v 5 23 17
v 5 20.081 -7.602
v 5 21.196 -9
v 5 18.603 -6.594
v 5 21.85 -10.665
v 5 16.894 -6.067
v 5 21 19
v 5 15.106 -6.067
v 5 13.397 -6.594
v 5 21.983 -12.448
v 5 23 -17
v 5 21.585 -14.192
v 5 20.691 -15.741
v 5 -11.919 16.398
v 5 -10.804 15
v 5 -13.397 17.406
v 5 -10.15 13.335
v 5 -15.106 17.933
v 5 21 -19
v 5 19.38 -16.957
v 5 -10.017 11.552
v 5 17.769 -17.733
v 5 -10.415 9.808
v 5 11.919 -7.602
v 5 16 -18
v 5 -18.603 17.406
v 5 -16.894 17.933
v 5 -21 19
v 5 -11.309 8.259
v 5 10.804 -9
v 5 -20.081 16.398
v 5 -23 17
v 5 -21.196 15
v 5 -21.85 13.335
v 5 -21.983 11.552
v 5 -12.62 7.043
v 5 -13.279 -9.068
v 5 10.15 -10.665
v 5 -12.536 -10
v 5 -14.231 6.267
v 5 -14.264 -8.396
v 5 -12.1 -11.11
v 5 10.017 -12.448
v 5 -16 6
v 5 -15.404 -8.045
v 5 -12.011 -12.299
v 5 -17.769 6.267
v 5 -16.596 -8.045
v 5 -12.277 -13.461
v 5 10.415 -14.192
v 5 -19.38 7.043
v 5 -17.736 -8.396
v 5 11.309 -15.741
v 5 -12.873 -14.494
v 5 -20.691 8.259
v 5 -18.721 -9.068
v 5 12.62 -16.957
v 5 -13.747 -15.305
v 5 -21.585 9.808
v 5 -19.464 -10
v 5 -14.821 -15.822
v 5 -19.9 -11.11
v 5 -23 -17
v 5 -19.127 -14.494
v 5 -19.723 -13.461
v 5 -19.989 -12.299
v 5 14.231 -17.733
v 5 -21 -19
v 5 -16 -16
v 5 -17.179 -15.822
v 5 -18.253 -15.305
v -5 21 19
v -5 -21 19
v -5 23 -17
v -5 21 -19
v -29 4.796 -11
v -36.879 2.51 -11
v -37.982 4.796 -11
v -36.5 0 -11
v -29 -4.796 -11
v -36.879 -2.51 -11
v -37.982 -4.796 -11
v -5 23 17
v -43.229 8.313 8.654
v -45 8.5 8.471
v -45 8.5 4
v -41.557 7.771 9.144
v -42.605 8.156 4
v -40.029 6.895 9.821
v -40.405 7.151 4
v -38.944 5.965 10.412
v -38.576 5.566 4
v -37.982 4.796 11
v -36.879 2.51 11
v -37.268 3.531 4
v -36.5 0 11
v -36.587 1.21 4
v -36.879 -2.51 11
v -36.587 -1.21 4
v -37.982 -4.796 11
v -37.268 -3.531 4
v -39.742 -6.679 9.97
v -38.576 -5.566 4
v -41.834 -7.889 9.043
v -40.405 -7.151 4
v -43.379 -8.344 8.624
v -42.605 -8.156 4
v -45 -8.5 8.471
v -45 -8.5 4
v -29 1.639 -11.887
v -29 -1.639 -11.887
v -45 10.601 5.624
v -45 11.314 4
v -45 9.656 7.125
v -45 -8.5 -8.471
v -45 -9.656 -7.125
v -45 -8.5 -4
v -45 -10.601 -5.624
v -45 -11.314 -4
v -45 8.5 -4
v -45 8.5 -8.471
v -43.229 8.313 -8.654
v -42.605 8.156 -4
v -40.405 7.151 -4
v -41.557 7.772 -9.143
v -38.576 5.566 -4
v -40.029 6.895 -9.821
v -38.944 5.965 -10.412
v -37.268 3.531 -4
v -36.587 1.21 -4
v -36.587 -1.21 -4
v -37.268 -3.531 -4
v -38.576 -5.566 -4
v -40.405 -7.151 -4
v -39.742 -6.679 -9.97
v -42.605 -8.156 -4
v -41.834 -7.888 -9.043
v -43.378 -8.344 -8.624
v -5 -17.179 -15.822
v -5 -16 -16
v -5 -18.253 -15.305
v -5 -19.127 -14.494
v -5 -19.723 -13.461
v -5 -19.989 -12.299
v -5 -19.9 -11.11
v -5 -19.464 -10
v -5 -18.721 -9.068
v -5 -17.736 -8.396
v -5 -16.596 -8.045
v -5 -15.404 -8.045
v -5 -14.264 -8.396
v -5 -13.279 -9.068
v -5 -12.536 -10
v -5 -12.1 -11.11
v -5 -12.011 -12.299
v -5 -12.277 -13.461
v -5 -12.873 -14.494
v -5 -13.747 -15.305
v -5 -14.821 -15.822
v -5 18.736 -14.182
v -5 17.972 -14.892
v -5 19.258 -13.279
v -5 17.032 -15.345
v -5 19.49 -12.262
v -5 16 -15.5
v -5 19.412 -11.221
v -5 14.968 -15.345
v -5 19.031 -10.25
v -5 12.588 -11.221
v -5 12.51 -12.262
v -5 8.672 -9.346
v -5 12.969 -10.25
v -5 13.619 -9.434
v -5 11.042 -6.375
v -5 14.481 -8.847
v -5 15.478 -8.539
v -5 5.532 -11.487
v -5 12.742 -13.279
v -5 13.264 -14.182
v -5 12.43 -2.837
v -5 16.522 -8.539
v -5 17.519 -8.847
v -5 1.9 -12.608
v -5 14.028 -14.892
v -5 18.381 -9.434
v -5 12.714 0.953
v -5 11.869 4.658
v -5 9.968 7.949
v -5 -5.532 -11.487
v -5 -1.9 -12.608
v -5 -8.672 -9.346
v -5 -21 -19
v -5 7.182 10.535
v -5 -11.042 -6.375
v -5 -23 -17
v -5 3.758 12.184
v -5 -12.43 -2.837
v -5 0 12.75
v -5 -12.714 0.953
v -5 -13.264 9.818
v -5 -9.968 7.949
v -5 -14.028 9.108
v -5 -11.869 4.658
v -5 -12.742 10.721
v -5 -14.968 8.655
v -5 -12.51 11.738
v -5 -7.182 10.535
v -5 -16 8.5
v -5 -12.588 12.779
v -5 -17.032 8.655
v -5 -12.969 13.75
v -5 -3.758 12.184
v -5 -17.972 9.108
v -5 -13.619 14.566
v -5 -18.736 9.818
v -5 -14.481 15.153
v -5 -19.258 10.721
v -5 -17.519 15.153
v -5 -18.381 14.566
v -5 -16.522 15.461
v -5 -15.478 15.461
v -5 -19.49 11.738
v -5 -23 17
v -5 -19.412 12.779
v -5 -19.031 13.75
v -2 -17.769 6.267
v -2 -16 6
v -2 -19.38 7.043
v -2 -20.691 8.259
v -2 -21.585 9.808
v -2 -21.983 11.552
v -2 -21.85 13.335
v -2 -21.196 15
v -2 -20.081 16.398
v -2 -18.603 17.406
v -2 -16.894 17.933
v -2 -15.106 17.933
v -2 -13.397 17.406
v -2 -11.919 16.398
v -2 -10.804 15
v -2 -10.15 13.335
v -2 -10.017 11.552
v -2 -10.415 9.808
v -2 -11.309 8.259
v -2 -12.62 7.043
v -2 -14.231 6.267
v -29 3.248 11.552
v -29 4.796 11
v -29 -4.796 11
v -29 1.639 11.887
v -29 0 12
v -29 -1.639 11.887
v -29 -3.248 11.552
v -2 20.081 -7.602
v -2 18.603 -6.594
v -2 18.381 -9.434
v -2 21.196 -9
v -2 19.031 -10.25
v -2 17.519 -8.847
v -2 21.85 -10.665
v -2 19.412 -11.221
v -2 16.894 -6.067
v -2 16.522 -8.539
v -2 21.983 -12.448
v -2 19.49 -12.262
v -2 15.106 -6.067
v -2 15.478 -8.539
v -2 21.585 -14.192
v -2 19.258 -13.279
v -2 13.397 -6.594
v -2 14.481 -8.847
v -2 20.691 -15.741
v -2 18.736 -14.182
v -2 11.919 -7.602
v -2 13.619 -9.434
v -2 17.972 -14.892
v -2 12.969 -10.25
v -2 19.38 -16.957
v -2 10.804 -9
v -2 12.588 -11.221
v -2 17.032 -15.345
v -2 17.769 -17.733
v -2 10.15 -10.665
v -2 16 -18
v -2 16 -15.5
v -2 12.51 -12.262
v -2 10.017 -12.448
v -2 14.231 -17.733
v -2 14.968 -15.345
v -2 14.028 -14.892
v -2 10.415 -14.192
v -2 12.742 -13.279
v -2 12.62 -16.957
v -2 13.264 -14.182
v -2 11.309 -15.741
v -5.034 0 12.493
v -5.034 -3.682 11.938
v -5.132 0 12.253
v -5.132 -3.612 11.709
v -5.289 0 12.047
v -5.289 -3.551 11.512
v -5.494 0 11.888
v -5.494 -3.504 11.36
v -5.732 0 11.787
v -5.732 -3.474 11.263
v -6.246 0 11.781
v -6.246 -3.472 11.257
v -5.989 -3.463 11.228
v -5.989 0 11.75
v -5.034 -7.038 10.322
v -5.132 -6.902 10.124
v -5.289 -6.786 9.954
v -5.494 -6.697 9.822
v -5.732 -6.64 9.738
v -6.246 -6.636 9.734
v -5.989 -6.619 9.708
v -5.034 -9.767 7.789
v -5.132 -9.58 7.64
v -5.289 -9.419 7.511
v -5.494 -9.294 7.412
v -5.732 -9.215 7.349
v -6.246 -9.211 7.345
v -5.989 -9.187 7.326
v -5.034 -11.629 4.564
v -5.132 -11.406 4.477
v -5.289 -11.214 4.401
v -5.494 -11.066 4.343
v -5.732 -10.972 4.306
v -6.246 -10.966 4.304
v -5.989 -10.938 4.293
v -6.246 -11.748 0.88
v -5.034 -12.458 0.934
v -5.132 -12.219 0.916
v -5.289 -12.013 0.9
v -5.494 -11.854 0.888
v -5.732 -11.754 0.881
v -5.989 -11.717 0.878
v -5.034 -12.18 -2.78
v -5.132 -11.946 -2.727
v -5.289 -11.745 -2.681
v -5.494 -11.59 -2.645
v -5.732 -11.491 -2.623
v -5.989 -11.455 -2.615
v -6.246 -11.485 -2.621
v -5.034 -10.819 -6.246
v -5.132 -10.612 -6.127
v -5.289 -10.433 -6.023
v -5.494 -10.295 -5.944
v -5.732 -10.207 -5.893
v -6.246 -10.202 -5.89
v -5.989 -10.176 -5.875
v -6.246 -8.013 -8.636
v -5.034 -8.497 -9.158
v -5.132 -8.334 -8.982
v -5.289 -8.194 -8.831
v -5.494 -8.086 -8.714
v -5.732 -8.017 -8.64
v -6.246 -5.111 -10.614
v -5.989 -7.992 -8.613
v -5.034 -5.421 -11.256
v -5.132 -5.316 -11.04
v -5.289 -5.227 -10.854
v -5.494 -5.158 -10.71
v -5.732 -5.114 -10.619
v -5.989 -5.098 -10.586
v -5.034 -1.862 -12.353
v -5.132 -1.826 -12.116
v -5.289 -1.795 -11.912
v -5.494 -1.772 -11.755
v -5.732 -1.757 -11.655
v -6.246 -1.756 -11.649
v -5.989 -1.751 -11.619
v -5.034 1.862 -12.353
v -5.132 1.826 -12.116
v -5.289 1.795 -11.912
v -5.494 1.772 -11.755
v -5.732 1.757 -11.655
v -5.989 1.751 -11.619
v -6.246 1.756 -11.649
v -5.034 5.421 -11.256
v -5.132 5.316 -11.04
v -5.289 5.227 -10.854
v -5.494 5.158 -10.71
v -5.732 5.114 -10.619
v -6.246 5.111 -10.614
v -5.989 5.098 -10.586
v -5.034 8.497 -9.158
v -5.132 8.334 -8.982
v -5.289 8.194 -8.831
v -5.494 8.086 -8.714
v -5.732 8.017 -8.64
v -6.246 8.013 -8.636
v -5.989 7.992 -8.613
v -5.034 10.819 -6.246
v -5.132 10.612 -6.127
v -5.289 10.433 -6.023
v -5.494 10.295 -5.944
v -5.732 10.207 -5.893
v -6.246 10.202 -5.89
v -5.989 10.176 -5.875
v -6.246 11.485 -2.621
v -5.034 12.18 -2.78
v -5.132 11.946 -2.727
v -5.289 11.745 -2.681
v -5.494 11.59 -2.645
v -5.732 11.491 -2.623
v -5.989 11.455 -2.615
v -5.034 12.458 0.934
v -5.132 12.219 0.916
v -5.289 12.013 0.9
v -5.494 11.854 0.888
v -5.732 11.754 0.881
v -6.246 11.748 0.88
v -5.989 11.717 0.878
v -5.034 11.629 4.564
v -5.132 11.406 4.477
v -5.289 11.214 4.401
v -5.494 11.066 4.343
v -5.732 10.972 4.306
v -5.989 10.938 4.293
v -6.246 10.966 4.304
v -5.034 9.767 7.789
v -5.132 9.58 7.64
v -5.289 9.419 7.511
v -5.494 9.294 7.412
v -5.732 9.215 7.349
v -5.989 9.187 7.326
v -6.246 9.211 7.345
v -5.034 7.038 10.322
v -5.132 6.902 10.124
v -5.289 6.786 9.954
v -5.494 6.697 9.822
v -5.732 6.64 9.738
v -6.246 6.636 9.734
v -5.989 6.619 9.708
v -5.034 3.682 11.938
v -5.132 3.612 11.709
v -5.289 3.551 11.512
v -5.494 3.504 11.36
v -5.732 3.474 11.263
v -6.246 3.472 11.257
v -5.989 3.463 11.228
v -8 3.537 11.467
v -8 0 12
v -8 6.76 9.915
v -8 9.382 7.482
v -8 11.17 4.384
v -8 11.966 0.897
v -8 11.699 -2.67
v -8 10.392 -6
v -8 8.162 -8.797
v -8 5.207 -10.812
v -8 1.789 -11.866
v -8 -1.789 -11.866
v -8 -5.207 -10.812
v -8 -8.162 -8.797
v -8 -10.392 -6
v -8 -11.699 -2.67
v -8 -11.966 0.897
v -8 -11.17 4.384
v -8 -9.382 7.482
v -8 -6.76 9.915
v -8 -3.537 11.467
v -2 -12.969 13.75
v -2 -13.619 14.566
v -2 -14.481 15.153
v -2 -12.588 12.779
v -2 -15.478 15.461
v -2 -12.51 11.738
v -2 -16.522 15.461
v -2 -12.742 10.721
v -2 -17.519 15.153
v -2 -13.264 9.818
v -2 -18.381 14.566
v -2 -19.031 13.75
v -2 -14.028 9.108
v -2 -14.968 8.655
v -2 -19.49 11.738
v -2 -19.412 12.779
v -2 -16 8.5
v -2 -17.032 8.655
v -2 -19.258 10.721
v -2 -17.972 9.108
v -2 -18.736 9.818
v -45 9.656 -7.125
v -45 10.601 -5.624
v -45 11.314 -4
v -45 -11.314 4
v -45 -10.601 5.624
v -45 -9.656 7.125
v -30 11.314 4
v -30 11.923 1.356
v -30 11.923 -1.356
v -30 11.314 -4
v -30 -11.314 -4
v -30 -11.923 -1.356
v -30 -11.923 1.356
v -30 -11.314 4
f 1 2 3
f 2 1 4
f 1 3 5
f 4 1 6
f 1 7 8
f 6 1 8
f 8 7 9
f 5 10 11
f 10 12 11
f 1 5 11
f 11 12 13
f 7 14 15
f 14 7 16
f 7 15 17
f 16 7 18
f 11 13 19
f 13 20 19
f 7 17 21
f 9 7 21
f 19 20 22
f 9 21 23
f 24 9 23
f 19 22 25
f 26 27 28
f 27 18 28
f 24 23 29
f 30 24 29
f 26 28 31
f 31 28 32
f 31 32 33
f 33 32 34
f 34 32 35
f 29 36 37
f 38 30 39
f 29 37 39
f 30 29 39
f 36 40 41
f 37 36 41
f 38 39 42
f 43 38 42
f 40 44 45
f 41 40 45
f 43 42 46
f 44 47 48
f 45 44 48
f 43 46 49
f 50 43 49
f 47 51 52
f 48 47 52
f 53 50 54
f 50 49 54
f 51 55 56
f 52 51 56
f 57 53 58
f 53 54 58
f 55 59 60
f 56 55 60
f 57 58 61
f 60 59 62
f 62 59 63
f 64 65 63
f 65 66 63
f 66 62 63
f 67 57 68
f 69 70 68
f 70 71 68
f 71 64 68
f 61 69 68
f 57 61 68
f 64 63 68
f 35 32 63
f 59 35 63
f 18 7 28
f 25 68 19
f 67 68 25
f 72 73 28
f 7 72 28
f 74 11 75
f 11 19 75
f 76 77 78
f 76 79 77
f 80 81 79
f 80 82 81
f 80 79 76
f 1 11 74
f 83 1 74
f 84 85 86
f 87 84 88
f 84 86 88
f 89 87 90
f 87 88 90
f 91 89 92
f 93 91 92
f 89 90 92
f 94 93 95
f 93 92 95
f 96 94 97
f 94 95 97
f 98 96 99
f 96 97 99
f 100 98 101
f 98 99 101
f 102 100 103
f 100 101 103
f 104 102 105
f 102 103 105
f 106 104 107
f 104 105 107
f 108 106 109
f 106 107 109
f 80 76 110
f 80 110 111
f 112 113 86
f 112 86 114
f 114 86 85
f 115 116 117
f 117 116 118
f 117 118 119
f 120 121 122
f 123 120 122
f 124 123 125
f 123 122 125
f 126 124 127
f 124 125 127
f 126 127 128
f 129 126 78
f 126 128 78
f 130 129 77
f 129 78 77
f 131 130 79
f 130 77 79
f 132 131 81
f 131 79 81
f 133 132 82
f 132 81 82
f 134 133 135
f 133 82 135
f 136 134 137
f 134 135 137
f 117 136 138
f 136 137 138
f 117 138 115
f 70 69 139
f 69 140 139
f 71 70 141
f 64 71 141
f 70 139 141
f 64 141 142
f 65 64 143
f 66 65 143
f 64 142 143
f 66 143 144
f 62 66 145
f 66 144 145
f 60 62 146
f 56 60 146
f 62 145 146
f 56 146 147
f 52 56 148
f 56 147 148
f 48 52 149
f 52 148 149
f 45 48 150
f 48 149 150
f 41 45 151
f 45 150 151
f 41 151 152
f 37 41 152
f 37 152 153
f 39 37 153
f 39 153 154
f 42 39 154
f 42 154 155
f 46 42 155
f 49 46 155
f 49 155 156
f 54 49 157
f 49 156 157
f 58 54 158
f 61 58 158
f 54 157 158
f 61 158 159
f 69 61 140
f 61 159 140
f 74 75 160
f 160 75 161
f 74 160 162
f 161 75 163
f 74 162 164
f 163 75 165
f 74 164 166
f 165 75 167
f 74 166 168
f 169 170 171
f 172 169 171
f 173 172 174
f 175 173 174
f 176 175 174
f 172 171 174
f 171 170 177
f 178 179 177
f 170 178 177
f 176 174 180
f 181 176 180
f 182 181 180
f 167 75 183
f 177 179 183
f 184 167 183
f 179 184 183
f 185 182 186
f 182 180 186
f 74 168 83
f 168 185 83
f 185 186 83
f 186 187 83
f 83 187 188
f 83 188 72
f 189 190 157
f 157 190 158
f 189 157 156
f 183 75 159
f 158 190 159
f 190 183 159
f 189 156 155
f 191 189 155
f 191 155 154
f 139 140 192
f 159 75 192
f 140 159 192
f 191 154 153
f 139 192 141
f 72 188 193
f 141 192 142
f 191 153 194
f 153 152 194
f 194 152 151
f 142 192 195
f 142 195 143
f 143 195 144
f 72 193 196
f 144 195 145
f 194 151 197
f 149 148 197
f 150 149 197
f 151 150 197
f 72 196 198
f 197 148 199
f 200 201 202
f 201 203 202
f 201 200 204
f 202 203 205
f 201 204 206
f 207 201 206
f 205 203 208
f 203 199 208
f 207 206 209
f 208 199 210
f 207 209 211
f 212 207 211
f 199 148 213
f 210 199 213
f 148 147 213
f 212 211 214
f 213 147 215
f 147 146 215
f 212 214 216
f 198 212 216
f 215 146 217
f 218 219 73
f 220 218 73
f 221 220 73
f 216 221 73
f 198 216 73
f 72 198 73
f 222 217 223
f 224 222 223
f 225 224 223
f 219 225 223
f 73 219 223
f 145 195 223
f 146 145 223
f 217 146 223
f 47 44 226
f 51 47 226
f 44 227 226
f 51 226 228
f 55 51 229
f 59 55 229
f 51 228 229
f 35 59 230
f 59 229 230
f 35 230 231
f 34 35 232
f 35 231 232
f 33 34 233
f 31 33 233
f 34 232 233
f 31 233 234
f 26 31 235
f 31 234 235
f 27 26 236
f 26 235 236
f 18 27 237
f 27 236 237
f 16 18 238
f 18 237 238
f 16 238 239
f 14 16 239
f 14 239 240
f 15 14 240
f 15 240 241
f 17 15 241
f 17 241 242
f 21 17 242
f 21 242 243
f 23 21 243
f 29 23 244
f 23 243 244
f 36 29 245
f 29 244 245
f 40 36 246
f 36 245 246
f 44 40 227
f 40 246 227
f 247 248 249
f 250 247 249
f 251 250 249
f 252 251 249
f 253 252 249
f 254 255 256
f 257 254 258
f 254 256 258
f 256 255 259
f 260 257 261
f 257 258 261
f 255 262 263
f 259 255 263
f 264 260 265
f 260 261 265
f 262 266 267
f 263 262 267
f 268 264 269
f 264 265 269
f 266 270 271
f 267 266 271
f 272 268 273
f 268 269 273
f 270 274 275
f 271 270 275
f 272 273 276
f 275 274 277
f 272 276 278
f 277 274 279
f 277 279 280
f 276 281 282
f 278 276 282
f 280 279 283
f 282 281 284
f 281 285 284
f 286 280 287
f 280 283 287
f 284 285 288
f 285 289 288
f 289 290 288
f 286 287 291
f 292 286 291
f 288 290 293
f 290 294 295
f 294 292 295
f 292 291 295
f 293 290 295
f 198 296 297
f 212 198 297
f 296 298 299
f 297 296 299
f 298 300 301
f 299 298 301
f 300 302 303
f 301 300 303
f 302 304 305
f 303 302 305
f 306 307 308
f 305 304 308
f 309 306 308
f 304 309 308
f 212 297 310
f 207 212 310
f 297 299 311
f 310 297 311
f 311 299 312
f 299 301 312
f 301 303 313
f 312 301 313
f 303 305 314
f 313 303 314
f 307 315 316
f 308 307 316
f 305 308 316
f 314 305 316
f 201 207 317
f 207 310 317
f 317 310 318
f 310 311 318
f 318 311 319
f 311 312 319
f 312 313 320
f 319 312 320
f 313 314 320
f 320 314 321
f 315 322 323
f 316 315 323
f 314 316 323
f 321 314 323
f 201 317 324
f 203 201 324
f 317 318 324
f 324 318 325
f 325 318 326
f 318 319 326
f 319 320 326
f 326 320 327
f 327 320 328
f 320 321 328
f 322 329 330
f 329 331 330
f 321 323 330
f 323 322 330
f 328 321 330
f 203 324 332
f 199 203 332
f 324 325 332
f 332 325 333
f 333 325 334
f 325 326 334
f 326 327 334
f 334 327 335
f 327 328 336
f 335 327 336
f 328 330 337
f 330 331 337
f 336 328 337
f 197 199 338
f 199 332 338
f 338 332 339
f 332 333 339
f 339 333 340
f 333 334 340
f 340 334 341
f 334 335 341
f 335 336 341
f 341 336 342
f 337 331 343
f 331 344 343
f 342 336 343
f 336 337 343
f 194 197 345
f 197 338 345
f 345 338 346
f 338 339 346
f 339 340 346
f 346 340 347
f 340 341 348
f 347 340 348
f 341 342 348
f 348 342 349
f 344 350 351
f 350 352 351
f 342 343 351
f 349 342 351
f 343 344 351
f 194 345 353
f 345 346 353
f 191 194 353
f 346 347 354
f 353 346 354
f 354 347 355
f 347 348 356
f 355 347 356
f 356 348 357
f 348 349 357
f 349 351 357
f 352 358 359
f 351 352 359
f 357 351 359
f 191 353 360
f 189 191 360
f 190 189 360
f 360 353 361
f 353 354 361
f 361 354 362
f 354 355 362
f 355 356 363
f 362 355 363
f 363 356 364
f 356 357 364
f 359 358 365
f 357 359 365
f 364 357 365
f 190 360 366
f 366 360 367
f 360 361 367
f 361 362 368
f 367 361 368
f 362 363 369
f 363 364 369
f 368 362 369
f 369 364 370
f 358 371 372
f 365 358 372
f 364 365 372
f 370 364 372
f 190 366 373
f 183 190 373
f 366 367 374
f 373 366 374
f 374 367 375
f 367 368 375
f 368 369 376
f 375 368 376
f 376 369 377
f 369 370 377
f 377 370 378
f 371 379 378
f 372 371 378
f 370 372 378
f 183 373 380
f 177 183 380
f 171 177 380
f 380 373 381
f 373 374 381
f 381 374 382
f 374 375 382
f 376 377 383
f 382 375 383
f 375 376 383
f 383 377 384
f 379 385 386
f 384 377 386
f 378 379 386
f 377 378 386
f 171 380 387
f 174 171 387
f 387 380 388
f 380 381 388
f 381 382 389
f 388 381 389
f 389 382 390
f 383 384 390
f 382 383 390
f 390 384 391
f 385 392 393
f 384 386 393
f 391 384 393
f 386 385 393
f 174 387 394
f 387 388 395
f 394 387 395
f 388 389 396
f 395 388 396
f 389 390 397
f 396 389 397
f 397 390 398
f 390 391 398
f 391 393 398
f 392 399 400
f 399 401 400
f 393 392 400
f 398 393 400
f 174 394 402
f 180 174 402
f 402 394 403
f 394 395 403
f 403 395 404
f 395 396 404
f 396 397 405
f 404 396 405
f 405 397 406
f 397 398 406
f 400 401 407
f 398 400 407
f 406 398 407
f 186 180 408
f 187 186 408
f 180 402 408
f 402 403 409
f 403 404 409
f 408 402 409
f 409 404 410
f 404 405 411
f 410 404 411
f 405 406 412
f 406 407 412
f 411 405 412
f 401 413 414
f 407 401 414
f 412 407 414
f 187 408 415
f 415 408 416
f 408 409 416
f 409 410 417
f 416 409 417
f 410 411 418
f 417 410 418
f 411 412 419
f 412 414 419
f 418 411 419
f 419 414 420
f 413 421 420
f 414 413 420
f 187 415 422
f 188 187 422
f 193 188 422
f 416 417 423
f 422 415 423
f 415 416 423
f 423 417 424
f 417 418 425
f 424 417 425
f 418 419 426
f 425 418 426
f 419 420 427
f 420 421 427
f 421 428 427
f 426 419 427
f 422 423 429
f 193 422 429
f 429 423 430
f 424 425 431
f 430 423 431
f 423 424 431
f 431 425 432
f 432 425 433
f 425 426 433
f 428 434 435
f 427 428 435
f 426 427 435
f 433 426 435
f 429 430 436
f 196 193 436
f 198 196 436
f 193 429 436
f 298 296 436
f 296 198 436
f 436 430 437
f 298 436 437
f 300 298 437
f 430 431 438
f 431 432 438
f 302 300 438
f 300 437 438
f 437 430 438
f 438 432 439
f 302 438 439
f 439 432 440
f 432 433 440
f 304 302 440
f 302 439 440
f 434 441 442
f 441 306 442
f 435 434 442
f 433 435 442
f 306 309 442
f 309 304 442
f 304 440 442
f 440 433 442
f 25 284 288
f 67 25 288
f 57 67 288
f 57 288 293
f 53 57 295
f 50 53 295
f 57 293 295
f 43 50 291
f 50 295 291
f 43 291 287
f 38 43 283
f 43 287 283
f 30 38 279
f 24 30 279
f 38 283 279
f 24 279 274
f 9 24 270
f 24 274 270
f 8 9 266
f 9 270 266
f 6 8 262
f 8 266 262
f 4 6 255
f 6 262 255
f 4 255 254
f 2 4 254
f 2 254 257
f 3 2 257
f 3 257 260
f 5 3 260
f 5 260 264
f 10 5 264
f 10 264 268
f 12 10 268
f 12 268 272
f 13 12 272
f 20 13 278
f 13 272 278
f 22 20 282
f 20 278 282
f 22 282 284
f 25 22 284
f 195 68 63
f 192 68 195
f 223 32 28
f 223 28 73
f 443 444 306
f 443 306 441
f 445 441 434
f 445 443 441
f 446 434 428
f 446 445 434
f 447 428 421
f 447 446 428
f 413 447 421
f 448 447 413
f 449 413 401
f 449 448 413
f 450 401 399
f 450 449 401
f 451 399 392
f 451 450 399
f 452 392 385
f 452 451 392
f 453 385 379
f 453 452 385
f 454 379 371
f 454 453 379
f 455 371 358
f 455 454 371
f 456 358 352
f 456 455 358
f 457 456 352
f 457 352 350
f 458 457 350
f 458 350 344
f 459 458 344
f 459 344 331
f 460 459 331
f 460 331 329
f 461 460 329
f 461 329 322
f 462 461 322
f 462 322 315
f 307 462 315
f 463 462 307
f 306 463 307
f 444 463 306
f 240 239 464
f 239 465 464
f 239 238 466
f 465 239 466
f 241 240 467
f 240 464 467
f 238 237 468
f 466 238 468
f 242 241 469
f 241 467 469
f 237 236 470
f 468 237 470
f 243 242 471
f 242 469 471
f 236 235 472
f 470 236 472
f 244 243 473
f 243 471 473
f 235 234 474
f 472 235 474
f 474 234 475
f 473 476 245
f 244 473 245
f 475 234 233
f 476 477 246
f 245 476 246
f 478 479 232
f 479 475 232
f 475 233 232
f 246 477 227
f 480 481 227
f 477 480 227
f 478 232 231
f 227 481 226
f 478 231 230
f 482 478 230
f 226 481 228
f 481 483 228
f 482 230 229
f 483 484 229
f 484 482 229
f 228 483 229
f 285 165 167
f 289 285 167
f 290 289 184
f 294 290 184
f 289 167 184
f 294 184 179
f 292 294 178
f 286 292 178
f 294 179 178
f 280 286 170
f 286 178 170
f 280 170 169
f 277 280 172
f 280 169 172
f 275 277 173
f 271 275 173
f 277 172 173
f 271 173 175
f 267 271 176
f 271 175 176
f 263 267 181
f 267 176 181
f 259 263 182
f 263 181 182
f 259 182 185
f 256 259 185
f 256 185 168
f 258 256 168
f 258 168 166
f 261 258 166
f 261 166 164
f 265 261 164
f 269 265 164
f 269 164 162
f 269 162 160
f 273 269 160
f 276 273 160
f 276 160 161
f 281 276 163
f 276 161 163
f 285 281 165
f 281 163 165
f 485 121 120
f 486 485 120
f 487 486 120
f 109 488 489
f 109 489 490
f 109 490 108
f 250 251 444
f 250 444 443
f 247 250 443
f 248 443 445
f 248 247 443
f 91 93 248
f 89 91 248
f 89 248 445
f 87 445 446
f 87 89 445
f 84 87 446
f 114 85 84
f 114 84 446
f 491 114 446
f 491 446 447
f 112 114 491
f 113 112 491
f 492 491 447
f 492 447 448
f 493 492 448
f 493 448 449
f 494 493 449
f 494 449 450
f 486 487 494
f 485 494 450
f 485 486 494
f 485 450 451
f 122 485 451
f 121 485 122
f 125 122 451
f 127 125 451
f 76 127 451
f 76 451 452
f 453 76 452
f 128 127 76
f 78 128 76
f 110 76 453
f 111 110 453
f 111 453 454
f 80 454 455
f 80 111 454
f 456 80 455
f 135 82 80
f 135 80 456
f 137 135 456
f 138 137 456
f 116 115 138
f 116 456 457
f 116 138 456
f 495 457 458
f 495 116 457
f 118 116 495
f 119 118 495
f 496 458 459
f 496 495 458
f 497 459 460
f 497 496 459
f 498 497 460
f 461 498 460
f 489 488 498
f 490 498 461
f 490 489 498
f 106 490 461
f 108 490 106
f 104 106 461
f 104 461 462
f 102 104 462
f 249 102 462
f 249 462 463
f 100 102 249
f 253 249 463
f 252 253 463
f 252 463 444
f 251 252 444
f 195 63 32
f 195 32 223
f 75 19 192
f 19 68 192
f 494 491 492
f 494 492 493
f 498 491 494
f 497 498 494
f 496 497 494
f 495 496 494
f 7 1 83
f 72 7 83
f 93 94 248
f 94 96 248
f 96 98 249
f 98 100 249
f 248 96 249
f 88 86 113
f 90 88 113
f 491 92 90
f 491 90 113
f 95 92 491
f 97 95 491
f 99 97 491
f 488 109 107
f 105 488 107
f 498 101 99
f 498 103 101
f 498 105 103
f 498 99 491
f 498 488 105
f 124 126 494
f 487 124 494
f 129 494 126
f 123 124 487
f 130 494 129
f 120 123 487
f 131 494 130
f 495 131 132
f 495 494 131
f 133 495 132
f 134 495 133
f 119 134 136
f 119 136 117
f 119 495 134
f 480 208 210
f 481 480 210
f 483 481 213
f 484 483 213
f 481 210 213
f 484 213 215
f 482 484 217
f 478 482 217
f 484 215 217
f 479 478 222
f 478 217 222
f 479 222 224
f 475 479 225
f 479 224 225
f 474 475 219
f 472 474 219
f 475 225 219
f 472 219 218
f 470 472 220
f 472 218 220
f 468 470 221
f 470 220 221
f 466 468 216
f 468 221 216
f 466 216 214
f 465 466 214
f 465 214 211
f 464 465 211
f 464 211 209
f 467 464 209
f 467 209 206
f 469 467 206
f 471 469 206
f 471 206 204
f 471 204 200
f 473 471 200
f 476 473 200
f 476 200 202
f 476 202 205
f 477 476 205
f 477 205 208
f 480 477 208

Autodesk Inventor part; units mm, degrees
ref_plane "YZ Plane" through (0, 0, 0) normal (1, 0, 0) x (0, 1, 0)
ref_plane "XZ Plane" through (0, 0, 0) normal (0, 1, 0) x (-1, 0, 0)
ref_plane "XY Plane" through (0, 0, 0) normal (0, 0, 1) x (1, 0, 0)
sketch "Эскиз1" plane through (0, 0, 0) normal (0, 1, 0) x (-1, 0, 0)
  line L0 (-5, -19) -> (5, -19)
  line L1 (5, -19) -> (5, 19)
  line L2 (5, 19) -> (-5, 19)
  line L3 (-5, 19) -> (-5, -19)
  line L4 (-5, -19) -> (5, 19) construction
  line L5 (5, -19) -> (-5, 19) construction
  line L6 (5, 0) -> (5, 12)
  line L7 (5, 12) -> (45, 12)
  line L8 (45, 12) -> (45, 0)
  line L9 (30, 0) -> (5, 0)
  line L10 (45, 0) -> (45, 4)
  line L11 (45, 4) -> (30, 4)
  line L12 (30, 4) -> (30, 0)
  line L13 (45, 12) -> (45, 11)
  line L14 (45, 11) -> (29, 11)
  line L15 (29, 11) -> (29, 12)
  line L16 (45, 4) -> (30, 4)
  line L17 (30, 4) -> (30, -4)
  line L18 (30, -4) -> (45, -4)
  line L19 (45, -4) -> (45, 4)
  line L20 (29, -11) -> (29, -12)
  line L21 (29, -12) -> (45, -12)
  line L22 (45, -12) -> (45, -11)
  line L23 (45, -11) -> (29, -11)
  line L24 (29, -11) -> (29, -12)
  line L25 (5, 12) -> (8, 12)
  line L26 (5, 0) -> (5, 11.75)
  line L27 (5, 11.75) -> (8, 11.75)
  line L28 (8, 11.75) -> (8, 12)
  line L29 (5, 11.75) -> (6, 11.75)
  line L30 (6, 11.75) -> (6, 12.75)
  line L31 (6, 12.75) -> (5, 12.75)
  line L32 (5, 12.75) -> (5, 11.75)
  circle A0 centre (6, 12.75) radius 1
  line L33 (8, 12) -> (6, 11.75)
  point P0 (0, 0)
  point P1 (6.2462, 11.7808)
  dimension "d0" = 10
  dimension "d1" = 38
  dimension "d2" = 12
  dimension "d3" = 40
  dimension "d4" = 4
  dimension "d5" = 15
  dimension "d6" = 1
  dimension "d7" = 16
  dimension "d13" = 8
  dimension "d14" = 22
  dimension "d15" = 1
  dimension "d60" = 3
  dimension "d61" = 11.75
  dimension "d62" = 1
  dimension "d63" = 1
extrude "Выдавливание1" add sketch "Эскиз1" along normal mid plane 46 contours L3 L2 L1 L0
revolve "Вращение1" add sketch "Эскиз1" angle 360 about axis through (-30, 0, 0) along (1, 0, 0) contours L1 L27 L28 L7 L15 L14 L8 L11 L12 L9 | L1 L7 A0 L27 | A0 L7 L1 | A0 L33 L28 L27 | L14 L15 L7 L8
extrude "Выдавливание3" cut sketch "Эскиз1" along normal mid plane 46 contours L12 L11 L8 L19 L18 L17 | L14 L15 L7 L8 | L23 L22 L21 L20
sketch "Эскиз3" plane through (-29, 4.7958, -11) normal (0, 0, -1) x (-1, 0, 0)
  line L0 (16, -9.5917) -> (16, 0) projected
  circle A0 centre (16, -4.7958) radius 8.5
  point P0 (-29, -4.7958)
  dimension "d21" = 17
extrude "Выдавливание5" cut sketch "Эскиз3" against normal blind 39
sketch "Эскиз4" plane through (5, -23, -19) normal (1, 0, 0) x (0, 0, -1)
  line L0 (-19, 23) -> (-19, 39)
  line L1 (-19, 39) -> (-31, 39)
  line L2 (-19, 23) -> (-19, 7)
  line L3 (-19, 7) -> (-7, 7)
  line L4 (-19, 7) -> (-31, 7)
  line L5 (-19, 39) -> (-7, 39)
  dimension "d24" = 16
  dimension "d25" = 12
  dimension "d26" = 16
  dimension "d27" = 12
  dimension "d28" = 12
hole "Отверстие3" at (5, 16, -12) at (5, -16, 12) direction (-1, 0, 0) diameter 7 end through all counterbore diameter 12 counterbore depth 7
hole "Отверстие4" at (5, -16, -12) direction (-1, 0, 0) diameter 8 end through all
chamfer "Фаска1" distance 2 angle 45 4 edges at (0, 23, -19) (0, -23, -19) (0, -23, 19) (0, 23, 19)
properties part number "Фиксатор-11"
